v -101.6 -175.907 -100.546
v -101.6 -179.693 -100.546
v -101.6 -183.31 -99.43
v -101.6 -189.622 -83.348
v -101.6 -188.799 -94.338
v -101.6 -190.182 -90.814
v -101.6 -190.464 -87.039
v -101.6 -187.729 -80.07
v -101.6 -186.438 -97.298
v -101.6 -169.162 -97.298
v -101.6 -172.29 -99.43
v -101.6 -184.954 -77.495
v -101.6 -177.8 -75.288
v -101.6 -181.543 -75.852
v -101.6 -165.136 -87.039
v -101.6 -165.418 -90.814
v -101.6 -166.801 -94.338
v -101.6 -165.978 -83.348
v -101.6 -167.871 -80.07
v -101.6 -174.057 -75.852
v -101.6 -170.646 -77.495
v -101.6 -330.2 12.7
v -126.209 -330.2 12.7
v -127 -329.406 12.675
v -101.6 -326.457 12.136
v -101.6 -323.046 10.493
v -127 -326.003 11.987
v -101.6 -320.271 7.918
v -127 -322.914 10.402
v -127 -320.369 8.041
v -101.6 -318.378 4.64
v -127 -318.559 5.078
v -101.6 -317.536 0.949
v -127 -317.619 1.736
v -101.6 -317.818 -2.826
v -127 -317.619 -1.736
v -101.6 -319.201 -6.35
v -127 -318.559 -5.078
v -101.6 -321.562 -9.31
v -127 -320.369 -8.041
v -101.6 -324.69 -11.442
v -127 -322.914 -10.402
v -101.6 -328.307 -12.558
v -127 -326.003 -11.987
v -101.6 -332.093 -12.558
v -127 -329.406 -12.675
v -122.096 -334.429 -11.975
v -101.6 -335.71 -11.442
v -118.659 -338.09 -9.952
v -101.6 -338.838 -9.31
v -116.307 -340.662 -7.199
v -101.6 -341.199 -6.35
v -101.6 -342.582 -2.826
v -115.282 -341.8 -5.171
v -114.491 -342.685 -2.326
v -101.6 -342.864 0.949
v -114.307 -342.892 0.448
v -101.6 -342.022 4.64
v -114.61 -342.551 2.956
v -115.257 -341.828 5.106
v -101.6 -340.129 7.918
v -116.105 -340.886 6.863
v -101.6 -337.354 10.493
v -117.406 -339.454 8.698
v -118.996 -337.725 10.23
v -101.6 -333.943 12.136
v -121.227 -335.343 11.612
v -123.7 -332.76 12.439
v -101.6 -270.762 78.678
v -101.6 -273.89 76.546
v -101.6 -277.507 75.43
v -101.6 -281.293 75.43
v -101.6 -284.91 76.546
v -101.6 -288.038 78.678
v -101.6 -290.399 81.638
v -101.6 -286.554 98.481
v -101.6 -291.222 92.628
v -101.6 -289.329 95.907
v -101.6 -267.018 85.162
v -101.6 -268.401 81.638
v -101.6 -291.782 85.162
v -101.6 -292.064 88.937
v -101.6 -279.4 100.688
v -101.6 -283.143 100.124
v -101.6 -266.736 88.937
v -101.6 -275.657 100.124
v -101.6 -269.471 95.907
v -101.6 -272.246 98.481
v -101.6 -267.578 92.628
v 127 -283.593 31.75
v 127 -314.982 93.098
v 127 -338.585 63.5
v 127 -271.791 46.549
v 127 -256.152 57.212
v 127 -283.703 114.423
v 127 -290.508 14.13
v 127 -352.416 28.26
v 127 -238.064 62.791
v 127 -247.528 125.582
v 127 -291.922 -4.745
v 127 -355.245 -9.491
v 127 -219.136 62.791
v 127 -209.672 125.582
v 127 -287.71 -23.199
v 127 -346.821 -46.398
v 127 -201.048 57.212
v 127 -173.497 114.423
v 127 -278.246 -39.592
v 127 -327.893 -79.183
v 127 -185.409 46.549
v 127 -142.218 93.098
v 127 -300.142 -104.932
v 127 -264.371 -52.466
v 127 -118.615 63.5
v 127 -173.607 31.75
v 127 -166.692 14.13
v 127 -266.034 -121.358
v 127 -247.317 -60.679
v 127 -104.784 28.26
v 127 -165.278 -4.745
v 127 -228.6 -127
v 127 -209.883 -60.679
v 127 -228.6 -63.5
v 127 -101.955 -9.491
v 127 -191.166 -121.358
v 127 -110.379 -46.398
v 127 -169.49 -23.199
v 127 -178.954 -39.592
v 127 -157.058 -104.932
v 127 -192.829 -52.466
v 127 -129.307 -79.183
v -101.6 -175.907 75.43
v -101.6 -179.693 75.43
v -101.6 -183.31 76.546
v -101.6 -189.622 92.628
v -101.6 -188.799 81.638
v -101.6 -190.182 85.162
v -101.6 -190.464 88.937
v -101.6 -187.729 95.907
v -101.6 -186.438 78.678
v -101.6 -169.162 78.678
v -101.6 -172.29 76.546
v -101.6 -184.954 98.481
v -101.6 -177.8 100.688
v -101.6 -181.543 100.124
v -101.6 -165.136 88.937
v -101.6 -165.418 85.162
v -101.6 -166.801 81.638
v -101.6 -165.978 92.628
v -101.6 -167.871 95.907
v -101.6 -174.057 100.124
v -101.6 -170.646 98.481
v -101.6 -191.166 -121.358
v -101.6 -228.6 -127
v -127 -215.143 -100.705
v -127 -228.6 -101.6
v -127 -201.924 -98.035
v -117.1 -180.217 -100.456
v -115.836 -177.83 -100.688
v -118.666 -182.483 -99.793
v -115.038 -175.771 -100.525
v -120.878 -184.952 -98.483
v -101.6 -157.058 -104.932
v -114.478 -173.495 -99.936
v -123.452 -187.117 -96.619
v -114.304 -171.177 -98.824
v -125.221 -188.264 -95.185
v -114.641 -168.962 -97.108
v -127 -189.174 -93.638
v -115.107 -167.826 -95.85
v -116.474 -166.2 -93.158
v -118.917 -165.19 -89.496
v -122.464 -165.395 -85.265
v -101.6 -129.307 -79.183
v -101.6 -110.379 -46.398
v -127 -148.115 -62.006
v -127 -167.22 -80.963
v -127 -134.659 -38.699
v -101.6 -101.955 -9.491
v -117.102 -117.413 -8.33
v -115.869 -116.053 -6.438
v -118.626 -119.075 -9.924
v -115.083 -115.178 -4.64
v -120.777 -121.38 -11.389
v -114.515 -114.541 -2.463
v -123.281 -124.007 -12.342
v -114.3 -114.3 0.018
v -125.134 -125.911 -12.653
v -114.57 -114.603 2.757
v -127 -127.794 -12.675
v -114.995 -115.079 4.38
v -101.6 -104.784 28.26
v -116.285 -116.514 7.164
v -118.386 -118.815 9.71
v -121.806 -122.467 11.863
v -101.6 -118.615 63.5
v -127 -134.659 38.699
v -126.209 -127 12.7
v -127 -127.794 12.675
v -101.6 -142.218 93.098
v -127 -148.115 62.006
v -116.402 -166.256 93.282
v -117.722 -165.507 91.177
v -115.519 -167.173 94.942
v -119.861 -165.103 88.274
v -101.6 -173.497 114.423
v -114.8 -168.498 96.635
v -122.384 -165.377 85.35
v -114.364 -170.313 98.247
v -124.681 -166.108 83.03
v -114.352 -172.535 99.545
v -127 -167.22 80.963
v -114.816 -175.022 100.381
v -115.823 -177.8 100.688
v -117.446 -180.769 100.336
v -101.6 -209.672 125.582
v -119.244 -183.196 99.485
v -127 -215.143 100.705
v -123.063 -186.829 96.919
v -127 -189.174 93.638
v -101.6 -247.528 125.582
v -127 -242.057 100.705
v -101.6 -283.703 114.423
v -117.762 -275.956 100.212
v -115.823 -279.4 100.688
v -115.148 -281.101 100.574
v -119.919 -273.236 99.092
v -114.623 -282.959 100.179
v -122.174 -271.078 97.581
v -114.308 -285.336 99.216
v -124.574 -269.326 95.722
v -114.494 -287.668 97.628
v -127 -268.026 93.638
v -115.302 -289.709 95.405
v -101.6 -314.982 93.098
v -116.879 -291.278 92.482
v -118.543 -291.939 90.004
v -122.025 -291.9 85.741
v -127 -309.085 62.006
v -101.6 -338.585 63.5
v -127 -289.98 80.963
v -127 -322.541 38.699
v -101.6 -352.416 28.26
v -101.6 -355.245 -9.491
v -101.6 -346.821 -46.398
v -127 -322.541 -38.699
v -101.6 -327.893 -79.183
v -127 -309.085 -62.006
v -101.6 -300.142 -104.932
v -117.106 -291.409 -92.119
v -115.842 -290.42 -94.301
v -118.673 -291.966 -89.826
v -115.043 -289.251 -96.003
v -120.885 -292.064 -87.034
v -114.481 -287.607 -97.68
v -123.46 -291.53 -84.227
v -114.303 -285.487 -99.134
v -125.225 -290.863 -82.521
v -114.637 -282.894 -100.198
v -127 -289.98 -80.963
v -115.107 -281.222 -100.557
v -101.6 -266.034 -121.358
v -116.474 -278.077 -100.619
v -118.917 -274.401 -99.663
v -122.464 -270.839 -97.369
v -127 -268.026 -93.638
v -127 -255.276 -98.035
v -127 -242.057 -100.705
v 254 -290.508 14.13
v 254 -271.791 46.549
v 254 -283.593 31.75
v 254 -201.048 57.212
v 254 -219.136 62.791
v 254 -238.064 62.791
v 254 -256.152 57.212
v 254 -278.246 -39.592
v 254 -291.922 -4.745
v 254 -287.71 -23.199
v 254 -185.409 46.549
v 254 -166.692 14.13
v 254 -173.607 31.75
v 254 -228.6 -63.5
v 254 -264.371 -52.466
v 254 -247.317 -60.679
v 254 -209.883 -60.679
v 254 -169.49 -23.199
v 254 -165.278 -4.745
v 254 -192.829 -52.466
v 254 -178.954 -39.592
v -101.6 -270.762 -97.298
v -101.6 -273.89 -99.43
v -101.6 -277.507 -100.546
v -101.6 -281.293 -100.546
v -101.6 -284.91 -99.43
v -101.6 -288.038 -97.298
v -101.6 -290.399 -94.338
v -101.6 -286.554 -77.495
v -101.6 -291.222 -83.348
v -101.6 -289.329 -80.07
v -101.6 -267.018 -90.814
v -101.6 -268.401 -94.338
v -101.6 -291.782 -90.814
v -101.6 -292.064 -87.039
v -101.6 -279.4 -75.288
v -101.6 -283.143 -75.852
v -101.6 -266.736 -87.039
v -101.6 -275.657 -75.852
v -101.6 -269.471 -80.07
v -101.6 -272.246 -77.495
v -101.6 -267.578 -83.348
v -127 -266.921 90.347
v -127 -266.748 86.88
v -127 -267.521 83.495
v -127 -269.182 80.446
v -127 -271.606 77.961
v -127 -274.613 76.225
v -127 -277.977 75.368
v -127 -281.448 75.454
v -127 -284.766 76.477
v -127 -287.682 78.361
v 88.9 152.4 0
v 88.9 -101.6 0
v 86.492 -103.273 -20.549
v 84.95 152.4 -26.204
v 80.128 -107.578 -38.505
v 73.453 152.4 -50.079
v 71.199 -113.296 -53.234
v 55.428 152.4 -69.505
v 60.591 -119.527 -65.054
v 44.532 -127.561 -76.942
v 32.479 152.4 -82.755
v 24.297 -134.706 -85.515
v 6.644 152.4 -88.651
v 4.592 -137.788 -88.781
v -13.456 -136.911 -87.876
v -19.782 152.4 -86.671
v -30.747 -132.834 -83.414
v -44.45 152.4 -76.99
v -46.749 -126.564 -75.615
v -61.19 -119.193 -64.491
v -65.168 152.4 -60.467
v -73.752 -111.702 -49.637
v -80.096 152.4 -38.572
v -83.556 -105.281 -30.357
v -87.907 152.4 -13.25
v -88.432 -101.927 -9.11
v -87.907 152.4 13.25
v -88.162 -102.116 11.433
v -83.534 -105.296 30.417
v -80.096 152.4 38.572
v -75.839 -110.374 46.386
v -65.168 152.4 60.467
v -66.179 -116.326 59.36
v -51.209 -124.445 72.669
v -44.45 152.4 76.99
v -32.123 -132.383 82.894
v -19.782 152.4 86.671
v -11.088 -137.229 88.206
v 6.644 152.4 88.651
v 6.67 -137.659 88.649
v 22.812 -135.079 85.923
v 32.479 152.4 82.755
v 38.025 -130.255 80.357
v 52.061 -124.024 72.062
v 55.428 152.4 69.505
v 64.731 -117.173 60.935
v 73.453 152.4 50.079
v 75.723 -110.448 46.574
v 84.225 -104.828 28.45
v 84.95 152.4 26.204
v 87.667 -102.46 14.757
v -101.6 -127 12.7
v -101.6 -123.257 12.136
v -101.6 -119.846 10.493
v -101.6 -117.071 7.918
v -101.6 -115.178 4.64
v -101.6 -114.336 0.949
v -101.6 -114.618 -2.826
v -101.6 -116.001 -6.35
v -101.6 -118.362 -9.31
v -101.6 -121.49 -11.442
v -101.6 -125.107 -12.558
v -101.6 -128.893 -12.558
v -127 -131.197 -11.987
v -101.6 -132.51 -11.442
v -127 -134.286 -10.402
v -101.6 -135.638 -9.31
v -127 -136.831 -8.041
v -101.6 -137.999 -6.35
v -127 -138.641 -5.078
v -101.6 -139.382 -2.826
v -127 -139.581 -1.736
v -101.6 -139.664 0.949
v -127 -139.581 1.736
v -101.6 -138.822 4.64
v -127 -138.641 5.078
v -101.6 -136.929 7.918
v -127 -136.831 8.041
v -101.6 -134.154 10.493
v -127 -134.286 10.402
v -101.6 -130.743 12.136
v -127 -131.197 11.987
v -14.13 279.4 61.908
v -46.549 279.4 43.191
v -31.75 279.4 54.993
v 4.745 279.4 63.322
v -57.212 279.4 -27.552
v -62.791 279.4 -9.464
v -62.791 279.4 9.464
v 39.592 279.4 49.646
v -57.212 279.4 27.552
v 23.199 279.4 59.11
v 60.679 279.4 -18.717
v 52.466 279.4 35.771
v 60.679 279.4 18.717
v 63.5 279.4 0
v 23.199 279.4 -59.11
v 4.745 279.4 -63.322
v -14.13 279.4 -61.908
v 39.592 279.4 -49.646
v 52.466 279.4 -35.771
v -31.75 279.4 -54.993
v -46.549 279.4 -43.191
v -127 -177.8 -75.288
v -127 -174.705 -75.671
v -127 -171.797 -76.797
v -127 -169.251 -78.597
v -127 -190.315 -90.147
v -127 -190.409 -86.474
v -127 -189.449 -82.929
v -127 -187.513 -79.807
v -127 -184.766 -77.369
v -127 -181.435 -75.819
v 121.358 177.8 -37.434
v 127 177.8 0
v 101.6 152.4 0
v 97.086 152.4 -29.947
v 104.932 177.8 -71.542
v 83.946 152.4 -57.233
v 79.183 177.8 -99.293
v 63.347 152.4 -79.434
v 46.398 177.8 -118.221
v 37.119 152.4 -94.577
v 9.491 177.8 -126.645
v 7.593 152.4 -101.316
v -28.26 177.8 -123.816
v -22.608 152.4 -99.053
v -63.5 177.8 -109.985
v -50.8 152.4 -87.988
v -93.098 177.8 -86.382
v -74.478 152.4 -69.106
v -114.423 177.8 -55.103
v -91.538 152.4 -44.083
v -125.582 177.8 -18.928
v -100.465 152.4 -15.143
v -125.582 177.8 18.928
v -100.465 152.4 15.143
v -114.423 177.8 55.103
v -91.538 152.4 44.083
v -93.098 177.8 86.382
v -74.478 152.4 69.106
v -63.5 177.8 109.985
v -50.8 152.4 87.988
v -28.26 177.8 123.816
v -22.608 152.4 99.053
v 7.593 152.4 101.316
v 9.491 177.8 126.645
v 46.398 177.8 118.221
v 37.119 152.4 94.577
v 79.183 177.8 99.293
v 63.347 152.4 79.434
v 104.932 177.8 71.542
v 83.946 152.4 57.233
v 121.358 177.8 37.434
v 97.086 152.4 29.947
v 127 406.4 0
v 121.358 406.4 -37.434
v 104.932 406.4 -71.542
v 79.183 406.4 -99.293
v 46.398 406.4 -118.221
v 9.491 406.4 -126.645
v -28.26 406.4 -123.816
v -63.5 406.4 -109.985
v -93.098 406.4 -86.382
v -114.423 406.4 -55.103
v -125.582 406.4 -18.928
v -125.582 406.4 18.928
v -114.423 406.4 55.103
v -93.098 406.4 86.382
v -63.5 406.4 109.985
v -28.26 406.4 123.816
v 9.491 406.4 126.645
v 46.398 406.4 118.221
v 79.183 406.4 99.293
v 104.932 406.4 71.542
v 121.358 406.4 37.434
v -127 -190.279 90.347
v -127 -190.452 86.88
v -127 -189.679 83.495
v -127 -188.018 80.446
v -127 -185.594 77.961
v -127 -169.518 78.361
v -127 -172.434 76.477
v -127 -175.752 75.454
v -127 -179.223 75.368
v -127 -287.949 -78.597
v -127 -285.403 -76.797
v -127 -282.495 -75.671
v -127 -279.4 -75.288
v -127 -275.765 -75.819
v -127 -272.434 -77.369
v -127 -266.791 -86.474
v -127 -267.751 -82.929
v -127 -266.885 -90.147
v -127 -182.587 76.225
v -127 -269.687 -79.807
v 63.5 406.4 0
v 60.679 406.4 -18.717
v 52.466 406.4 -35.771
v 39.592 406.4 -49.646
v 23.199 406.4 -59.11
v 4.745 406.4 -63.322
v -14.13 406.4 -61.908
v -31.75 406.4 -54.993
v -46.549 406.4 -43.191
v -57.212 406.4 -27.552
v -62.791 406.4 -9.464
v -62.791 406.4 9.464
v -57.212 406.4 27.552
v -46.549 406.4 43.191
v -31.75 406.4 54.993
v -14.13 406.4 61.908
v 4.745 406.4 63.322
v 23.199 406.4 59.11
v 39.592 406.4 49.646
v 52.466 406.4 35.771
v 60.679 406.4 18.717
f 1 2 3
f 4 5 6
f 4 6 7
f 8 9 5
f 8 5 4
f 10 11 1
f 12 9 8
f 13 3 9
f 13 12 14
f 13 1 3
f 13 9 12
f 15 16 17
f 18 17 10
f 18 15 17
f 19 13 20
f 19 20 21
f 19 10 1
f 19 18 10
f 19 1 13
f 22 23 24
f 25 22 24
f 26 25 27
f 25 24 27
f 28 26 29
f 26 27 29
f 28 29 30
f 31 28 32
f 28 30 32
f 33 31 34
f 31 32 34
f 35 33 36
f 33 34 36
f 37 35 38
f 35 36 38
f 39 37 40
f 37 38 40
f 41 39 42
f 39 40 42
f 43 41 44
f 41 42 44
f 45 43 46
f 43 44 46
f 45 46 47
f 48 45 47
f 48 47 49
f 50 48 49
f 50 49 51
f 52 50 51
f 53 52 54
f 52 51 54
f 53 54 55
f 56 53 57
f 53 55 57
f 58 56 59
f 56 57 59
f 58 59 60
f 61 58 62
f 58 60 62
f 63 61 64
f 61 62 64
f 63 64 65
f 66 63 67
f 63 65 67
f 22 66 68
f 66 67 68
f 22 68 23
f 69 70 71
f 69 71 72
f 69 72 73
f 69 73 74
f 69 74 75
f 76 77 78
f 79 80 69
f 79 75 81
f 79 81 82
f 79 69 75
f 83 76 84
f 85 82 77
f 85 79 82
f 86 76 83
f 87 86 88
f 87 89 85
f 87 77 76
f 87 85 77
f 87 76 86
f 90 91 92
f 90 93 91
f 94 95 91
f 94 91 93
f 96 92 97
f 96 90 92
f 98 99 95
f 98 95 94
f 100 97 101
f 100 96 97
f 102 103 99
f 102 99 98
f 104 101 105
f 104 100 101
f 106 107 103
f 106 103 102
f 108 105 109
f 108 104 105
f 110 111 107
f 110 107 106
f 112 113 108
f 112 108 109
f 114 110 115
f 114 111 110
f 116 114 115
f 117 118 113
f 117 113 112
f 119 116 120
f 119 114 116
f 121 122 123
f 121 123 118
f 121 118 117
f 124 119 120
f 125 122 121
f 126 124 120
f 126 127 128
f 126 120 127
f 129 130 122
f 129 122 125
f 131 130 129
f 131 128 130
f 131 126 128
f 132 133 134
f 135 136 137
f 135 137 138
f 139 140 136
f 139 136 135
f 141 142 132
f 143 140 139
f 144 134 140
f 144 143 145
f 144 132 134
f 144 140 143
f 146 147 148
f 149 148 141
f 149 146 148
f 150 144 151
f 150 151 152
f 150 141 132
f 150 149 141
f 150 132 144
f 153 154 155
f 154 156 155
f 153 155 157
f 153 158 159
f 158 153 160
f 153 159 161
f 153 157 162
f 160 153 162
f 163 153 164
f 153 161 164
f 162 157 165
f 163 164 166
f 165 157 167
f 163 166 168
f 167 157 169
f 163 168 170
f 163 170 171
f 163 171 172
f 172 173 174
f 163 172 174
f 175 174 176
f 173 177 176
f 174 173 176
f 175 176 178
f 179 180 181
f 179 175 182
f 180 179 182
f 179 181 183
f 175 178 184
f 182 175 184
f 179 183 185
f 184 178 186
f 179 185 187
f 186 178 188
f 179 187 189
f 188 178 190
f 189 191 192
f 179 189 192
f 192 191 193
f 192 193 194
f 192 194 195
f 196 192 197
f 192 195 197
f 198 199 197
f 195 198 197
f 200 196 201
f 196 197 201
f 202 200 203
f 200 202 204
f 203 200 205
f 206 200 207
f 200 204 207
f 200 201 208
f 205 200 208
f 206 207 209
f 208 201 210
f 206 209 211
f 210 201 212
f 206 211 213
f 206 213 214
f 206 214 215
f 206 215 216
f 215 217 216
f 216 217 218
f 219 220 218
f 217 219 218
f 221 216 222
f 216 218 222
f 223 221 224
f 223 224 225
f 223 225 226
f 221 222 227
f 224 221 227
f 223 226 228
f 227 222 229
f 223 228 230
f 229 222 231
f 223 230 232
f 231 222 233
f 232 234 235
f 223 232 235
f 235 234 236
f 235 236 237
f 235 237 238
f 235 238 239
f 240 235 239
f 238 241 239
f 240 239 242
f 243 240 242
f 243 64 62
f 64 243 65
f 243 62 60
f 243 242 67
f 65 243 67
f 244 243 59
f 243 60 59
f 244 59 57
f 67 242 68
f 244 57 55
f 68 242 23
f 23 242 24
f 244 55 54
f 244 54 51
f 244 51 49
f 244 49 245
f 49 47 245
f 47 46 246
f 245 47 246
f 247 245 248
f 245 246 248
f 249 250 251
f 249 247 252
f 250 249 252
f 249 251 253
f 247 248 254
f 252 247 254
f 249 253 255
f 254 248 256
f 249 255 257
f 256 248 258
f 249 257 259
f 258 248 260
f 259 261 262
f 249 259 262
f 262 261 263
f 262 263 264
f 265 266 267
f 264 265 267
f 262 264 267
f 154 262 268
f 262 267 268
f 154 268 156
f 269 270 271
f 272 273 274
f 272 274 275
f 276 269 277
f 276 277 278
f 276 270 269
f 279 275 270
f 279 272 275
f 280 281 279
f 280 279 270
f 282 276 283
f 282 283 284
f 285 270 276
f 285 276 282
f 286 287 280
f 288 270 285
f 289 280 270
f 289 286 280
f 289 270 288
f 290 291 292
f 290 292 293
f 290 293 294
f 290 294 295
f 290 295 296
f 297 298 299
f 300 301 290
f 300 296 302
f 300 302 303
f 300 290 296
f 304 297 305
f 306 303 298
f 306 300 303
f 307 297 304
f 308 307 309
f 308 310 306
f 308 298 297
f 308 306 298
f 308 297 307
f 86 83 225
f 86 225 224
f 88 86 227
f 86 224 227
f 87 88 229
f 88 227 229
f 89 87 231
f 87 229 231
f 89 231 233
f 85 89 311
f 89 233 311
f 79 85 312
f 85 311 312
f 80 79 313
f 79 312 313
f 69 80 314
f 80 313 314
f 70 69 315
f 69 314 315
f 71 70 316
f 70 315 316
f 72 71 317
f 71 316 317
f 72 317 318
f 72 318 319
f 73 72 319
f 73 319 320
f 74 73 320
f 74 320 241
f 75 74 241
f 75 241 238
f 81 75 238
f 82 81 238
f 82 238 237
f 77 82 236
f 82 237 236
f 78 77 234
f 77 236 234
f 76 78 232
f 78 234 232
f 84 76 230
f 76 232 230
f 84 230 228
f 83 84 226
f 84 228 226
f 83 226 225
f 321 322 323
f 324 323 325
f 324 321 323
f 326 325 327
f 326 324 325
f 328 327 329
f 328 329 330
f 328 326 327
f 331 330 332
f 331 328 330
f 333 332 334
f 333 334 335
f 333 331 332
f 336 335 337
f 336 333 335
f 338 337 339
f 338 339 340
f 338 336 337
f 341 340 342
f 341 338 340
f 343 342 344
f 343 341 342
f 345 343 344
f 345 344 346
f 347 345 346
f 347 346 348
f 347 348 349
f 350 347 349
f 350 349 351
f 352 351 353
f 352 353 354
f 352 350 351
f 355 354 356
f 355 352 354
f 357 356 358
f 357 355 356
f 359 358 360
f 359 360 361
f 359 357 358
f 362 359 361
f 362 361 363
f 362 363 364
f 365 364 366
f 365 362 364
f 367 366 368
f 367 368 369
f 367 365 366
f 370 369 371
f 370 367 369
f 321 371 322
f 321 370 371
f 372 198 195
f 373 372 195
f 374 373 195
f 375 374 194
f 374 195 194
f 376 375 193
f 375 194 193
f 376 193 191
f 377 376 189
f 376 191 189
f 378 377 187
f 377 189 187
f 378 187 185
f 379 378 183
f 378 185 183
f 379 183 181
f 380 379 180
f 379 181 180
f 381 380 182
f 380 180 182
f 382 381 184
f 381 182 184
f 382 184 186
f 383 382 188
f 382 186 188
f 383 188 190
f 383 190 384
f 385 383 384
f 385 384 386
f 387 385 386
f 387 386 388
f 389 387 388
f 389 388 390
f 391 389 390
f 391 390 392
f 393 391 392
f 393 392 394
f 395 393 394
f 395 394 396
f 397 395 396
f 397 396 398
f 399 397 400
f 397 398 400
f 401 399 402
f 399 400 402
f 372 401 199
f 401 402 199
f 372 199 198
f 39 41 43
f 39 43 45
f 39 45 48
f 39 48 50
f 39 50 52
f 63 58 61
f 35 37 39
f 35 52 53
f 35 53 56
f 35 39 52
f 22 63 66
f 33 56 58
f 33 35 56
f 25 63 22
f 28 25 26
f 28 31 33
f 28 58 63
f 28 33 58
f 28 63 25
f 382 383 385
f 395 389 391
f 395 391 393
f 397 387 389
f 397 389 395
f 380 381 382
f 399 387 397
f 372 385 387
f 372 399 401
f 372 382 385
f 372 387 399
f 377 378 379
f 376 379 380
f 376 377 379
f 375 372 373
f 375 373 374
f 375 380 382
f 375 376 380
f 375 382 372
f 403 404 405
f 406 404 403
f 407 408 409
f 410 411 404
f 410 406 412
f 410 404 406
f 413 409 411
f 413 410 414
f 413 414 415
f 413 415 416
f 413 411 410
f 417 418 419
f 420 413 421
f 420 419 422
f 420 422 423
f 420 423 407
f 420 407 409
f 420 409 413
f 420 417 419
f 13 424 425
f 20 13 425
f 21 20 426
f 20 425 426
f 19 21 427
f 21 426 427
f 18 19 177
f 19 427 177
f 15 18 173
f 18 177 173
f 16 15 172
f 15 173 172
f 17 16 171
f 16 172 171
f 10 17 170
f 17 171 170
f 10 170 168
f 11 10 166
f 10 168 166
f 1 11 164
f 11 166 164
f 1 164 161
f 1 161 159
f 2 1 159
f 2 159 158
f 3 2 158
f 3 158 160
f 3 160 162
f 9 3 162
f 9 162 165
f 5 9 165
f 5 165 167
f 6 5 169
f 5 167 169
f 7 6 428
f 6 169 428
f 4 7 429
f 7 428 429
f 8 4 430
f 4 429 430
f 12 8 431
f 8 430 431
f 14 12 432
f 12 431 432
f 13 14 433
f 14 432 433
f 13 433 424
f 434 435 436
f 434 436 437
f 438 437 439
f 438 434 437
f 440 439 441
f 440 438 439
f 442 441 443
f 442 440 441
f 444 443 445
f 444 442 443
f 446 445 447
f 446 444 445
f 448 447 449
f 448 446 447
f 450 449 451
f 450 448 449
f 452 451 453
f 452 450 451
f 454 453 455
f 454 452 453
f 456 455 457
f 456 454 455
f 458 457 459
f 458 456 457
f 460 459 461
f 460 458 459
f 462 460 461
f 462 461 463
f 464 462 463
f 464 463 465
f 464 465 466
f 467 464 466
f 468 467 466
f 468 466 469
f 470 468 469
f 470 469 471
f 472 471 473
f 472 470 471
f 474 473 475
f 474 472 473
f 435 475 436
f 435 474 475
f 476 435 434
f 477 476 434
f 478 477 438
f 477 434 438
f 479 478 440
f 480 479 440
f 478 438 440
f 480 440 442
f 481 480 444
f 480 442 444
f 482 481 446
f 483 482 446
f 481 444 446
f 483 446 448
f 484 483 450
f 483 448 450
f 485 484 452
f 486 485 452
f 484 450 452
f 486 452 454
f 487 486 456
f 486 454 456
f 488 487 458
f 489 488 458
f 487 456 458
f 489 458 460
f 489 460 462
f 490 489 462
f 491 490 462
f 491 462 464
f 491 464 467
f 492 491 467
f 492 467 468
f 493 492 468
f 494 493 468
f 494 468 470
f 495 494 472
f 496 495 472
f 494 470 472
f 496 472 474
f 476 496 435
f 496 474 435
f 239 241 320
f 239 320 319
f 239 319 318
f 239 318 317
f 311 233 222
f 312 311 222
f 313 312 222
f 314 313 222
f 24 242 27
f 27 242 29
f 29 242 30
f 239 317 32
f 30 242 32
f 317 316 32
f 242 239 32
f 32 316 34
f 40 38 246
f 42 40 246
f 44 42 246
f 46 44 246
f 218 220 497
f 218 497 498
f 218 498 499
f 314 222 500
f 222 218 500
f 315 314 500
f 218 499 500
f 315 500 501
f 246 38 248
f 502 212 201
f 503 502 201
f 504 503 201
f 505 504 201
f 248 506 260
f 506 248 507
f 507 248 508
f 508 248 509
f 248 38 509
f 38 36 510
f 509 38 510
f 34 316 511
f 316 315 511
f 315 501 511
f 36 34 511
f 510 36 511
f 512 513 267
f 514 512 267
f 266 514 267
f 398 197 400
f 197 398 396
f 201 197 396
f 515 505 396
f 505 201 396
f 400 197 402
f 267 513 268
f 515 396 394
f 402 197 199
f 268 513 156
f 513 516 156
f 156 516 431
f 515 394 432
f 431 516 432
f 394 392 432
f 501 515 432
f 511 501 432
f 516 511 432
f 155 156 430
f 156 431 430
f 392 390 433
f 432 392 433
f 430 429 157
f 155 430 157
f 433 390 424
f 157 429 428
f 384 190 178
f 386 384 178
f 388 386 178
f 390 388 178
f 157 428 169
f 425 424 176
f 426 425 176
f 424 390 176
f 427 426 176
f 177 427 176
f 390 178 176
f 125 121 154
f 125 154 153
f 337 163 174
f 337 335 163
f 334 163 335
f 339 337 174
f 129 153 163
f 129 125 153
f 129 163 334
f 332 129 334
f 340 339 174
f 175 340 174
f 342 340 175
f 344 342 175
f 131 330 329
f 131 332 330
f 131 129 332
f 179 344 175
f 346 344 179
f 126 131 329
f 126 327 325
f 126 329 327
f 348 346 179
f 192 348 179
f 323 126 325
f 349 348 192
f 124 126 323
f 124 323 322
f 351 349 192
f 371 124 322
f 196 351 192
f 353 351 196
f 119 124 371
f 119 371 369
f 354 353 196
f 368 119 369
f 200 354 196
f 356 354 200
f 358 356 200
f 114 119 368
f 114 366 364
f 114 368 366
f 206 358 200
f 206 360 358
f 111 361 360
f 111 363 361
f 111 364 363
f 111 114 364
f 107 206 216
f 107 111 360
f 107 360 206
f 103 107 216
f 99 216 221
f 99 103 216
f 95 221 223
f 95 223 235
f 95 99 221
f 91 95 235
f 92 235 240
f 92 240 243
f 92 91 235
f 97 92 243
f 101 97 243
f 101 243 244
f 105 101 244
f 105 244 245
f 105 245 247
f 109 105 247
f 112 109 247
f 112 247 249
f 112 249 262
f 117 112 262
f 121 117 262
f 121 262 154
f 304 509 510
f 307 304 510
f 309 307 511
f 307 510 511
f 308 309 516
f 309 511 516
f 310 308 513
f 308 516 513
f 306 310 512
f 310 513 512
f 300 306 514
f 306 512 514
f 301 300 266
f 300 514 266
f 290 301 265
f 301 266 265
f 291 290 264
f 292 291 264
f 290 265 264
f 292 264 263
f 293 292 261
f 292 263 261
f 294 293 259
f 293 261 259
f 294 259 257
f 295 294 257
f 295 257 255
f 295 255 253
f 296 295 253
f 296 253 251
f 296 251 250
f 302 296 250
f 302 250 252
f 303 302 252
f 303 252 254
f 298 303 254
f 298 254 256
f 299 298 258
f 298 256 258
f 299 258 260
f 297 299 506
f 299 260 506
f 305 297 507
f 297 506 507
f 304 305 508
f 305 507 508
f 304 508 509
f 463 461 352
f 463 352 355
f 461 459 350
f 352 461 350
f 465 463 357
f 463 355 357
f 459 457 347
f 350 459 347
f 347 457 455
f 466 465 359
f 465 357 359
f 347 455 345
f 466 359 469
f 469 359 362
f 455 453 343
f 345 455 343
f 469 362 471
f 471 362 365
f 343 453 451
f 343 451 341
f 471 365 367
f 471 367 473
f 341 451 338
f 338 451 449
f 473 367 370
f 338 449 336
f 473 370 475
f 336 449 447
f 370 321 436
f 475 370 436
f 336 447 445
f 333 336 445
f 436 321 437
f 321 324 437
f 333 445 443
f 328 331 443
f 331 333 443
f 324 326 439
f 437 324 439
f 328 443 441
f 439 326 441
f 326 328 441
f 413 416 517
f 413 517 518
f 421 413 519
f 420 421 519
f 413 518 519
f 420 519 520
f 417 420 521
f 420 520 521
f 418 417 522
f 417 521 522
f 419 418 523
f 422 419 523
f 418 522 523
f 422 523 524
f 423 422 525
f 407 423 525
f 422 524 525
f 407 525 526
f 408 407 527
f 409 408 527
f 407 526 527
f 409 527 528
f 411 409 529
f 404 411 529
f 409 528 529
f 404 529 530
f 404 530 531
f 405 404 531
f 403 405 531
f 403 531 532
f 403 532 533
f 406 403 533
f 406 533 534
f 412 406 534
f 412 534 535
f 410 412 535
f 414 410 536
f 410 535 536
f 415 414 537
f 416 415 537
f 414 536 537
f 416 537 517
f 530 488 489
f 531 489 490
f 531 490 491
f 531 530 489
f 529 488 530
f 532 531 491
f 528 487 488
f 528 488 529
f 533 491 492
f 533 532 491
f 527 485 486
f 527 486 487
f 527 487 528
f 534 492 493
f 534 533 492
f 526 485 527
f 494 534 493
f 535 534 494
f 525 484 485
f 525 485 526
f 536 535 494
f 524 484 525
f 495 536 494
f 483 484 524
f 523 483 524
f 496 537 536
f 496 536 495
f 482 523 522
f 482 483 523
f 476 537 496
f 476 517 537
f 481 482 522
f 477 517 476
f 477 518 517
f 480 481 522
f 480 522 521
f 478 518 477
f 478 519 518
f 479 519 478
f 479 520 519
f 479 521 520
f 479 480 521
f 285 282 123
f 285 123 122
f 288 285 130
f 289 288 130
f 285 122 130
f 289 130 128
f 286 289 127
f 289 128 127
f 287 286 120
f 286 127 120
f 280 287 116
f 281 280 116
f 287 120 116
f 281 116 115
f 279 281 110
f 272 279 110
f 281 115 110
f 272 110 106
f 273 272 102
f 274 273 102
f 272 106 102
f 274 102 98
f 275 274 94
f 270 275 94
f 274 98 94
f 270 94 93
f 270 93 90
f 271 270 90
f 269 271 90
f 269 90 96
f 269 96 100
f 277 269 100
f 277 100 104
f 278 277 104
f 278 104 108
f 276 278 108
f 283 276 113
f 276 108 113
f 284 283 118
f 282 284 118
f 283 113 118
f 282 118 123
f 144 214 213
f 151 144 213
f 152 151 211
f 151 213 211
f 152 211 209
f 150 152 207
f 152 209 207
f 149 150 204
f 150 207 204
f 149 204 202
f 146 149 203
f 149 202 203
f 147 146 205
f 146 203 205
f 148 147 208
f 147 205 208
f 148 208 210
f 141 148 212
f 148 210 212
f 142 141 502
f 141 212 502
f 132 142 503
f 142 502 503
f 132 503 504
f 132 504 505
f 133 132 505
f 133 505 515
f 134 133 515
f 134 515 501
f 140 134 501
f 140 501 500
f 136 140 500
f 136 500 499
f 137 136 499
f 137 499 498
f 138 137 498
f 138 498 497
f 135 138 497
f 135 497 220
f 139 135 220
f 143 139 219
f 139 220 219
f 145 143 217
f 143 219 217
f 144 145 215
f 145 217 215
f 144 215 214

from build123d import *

# Parameters (mm, degrees)
SKETCH1_R           = 88.9
BOSS_EXTRUDE1_DEPTH = 152.4
SKETCH4_R           = 127
BOSS_EXTRUDE2_DEPTH = 127
SKETCH5_R           = 63.5
BOSS_EXTRUDE3_DEPTH = 127
SKETCH6_R           = 127
BOSS_EXTRUDE4_DEPTH = 254
SKETCH7_R           = 63.5
CUT_EXTRUDE1_DEPTH  = 127
CHAMFER1_SIZE       = 25.4
SKETCH8_R           = 12.7
CUT_EXTRUDE2_DEPTH  = 25.4
CHAMFER2_SIZE       = 25.4


with BuildPart() as part:
    # Sketch1 → Boss-Extrude1 (new body, symmetric)
    with BuildSketch(Plane(origin=(0, 0, 0), x_dir=(1, 0, 0), z_dir=(0, 1, 0))):
        Circle(SKETCH1_R)
    extrude(amount=BOSS_EXTRUDE1_DEPTH, both=True)

    # Sketch4 → Boss-Extrude2 (add, symmetric)
    with BuildSketch(Plane(origin=(0, 0, 0), x_dir=(0, 0, -1), z_dir=(1, 0, 0))):
        with Locations((0, -228.6)):
            Circle(SKETCH4_R)
    extrude(amount=BOSS_EXTRUDE2_DEPTH, both=True)

    # Sketch5 → Boss-Extrude3 (add)
    with BuildSketch(Plane(origin=(127, 0, 0), x_dir=(0, 0, -1), z_dir=(1, 0, 0))):
        with Locations((0, -228.6)):
            Circle(SKETCH5_R)
    extrude(amount=BOSS_EXTRUDE3_DEPTH)

    # Sketch6 → Boss-Extrude4 (add)
    with BuildSketch(Plane(origin=(0, 152.4, 0), x_dir=(1, 0, 0), z_dir=(0, 1, 0))):
        Circle(SKETCH6_R)
    extrude(amount=BOSS_EXTRUDE4_DEPTH)

    # Sketch7 → Cut-Extrude1 (cut)
    with BuildSketch(Plane(origin=(0, 406.4, 0), x_dir=(1, 0, 0), z_dir=(0, 1, 0))):
        Circle(SKETCH7_R)
    extrude(amount=-CUT_EXTRUDE1_DEPTH, mode=Mode.SUBTRACT)

    # Chamfer1
    chamfer1_edges = [part.edges().sort_by_distance(p)[0] for p in [
        (-127, -228.6, 127),
    ]]
    chamfer(chamfer1_edges, length=CHAMFER1_SIZE)

    # Sketch8 → Cut-Extrude2 (cut)
    with BuildSketch(Plane.ZY.offset(127)):
        with Locations((0, -127)):
            Circle(SKETCH8_R)
        with Locations((87.988181025, -177.8)):
            Circle(SKETCH8_R)
        with Locations((87.988181025, -279.4)):
            Circle(SKETCH8_R)
        with Locations((0, -330.2)):
            Circle(SKETCH8_R)
        with Locations((-87.988181024, -279.4)):
            Circle(SKETCH8_R)
        with Locations((-87.988181024, -177.8)):
            Circle(SKETCH8_R)
    extrude(amount=-CUT_EXTRUDE2_DEPTH, mode=Mode.SUBTRACT)

    # Chamfer2
    chamfer2_edges = [part.edges().sort_by_distance(p)[0] for p in [
        (-127, 152.4, 0),
    ]]
    chamfer(chamfer2_edges, length=CHAMFER2_SIZE)


solid = part.part
